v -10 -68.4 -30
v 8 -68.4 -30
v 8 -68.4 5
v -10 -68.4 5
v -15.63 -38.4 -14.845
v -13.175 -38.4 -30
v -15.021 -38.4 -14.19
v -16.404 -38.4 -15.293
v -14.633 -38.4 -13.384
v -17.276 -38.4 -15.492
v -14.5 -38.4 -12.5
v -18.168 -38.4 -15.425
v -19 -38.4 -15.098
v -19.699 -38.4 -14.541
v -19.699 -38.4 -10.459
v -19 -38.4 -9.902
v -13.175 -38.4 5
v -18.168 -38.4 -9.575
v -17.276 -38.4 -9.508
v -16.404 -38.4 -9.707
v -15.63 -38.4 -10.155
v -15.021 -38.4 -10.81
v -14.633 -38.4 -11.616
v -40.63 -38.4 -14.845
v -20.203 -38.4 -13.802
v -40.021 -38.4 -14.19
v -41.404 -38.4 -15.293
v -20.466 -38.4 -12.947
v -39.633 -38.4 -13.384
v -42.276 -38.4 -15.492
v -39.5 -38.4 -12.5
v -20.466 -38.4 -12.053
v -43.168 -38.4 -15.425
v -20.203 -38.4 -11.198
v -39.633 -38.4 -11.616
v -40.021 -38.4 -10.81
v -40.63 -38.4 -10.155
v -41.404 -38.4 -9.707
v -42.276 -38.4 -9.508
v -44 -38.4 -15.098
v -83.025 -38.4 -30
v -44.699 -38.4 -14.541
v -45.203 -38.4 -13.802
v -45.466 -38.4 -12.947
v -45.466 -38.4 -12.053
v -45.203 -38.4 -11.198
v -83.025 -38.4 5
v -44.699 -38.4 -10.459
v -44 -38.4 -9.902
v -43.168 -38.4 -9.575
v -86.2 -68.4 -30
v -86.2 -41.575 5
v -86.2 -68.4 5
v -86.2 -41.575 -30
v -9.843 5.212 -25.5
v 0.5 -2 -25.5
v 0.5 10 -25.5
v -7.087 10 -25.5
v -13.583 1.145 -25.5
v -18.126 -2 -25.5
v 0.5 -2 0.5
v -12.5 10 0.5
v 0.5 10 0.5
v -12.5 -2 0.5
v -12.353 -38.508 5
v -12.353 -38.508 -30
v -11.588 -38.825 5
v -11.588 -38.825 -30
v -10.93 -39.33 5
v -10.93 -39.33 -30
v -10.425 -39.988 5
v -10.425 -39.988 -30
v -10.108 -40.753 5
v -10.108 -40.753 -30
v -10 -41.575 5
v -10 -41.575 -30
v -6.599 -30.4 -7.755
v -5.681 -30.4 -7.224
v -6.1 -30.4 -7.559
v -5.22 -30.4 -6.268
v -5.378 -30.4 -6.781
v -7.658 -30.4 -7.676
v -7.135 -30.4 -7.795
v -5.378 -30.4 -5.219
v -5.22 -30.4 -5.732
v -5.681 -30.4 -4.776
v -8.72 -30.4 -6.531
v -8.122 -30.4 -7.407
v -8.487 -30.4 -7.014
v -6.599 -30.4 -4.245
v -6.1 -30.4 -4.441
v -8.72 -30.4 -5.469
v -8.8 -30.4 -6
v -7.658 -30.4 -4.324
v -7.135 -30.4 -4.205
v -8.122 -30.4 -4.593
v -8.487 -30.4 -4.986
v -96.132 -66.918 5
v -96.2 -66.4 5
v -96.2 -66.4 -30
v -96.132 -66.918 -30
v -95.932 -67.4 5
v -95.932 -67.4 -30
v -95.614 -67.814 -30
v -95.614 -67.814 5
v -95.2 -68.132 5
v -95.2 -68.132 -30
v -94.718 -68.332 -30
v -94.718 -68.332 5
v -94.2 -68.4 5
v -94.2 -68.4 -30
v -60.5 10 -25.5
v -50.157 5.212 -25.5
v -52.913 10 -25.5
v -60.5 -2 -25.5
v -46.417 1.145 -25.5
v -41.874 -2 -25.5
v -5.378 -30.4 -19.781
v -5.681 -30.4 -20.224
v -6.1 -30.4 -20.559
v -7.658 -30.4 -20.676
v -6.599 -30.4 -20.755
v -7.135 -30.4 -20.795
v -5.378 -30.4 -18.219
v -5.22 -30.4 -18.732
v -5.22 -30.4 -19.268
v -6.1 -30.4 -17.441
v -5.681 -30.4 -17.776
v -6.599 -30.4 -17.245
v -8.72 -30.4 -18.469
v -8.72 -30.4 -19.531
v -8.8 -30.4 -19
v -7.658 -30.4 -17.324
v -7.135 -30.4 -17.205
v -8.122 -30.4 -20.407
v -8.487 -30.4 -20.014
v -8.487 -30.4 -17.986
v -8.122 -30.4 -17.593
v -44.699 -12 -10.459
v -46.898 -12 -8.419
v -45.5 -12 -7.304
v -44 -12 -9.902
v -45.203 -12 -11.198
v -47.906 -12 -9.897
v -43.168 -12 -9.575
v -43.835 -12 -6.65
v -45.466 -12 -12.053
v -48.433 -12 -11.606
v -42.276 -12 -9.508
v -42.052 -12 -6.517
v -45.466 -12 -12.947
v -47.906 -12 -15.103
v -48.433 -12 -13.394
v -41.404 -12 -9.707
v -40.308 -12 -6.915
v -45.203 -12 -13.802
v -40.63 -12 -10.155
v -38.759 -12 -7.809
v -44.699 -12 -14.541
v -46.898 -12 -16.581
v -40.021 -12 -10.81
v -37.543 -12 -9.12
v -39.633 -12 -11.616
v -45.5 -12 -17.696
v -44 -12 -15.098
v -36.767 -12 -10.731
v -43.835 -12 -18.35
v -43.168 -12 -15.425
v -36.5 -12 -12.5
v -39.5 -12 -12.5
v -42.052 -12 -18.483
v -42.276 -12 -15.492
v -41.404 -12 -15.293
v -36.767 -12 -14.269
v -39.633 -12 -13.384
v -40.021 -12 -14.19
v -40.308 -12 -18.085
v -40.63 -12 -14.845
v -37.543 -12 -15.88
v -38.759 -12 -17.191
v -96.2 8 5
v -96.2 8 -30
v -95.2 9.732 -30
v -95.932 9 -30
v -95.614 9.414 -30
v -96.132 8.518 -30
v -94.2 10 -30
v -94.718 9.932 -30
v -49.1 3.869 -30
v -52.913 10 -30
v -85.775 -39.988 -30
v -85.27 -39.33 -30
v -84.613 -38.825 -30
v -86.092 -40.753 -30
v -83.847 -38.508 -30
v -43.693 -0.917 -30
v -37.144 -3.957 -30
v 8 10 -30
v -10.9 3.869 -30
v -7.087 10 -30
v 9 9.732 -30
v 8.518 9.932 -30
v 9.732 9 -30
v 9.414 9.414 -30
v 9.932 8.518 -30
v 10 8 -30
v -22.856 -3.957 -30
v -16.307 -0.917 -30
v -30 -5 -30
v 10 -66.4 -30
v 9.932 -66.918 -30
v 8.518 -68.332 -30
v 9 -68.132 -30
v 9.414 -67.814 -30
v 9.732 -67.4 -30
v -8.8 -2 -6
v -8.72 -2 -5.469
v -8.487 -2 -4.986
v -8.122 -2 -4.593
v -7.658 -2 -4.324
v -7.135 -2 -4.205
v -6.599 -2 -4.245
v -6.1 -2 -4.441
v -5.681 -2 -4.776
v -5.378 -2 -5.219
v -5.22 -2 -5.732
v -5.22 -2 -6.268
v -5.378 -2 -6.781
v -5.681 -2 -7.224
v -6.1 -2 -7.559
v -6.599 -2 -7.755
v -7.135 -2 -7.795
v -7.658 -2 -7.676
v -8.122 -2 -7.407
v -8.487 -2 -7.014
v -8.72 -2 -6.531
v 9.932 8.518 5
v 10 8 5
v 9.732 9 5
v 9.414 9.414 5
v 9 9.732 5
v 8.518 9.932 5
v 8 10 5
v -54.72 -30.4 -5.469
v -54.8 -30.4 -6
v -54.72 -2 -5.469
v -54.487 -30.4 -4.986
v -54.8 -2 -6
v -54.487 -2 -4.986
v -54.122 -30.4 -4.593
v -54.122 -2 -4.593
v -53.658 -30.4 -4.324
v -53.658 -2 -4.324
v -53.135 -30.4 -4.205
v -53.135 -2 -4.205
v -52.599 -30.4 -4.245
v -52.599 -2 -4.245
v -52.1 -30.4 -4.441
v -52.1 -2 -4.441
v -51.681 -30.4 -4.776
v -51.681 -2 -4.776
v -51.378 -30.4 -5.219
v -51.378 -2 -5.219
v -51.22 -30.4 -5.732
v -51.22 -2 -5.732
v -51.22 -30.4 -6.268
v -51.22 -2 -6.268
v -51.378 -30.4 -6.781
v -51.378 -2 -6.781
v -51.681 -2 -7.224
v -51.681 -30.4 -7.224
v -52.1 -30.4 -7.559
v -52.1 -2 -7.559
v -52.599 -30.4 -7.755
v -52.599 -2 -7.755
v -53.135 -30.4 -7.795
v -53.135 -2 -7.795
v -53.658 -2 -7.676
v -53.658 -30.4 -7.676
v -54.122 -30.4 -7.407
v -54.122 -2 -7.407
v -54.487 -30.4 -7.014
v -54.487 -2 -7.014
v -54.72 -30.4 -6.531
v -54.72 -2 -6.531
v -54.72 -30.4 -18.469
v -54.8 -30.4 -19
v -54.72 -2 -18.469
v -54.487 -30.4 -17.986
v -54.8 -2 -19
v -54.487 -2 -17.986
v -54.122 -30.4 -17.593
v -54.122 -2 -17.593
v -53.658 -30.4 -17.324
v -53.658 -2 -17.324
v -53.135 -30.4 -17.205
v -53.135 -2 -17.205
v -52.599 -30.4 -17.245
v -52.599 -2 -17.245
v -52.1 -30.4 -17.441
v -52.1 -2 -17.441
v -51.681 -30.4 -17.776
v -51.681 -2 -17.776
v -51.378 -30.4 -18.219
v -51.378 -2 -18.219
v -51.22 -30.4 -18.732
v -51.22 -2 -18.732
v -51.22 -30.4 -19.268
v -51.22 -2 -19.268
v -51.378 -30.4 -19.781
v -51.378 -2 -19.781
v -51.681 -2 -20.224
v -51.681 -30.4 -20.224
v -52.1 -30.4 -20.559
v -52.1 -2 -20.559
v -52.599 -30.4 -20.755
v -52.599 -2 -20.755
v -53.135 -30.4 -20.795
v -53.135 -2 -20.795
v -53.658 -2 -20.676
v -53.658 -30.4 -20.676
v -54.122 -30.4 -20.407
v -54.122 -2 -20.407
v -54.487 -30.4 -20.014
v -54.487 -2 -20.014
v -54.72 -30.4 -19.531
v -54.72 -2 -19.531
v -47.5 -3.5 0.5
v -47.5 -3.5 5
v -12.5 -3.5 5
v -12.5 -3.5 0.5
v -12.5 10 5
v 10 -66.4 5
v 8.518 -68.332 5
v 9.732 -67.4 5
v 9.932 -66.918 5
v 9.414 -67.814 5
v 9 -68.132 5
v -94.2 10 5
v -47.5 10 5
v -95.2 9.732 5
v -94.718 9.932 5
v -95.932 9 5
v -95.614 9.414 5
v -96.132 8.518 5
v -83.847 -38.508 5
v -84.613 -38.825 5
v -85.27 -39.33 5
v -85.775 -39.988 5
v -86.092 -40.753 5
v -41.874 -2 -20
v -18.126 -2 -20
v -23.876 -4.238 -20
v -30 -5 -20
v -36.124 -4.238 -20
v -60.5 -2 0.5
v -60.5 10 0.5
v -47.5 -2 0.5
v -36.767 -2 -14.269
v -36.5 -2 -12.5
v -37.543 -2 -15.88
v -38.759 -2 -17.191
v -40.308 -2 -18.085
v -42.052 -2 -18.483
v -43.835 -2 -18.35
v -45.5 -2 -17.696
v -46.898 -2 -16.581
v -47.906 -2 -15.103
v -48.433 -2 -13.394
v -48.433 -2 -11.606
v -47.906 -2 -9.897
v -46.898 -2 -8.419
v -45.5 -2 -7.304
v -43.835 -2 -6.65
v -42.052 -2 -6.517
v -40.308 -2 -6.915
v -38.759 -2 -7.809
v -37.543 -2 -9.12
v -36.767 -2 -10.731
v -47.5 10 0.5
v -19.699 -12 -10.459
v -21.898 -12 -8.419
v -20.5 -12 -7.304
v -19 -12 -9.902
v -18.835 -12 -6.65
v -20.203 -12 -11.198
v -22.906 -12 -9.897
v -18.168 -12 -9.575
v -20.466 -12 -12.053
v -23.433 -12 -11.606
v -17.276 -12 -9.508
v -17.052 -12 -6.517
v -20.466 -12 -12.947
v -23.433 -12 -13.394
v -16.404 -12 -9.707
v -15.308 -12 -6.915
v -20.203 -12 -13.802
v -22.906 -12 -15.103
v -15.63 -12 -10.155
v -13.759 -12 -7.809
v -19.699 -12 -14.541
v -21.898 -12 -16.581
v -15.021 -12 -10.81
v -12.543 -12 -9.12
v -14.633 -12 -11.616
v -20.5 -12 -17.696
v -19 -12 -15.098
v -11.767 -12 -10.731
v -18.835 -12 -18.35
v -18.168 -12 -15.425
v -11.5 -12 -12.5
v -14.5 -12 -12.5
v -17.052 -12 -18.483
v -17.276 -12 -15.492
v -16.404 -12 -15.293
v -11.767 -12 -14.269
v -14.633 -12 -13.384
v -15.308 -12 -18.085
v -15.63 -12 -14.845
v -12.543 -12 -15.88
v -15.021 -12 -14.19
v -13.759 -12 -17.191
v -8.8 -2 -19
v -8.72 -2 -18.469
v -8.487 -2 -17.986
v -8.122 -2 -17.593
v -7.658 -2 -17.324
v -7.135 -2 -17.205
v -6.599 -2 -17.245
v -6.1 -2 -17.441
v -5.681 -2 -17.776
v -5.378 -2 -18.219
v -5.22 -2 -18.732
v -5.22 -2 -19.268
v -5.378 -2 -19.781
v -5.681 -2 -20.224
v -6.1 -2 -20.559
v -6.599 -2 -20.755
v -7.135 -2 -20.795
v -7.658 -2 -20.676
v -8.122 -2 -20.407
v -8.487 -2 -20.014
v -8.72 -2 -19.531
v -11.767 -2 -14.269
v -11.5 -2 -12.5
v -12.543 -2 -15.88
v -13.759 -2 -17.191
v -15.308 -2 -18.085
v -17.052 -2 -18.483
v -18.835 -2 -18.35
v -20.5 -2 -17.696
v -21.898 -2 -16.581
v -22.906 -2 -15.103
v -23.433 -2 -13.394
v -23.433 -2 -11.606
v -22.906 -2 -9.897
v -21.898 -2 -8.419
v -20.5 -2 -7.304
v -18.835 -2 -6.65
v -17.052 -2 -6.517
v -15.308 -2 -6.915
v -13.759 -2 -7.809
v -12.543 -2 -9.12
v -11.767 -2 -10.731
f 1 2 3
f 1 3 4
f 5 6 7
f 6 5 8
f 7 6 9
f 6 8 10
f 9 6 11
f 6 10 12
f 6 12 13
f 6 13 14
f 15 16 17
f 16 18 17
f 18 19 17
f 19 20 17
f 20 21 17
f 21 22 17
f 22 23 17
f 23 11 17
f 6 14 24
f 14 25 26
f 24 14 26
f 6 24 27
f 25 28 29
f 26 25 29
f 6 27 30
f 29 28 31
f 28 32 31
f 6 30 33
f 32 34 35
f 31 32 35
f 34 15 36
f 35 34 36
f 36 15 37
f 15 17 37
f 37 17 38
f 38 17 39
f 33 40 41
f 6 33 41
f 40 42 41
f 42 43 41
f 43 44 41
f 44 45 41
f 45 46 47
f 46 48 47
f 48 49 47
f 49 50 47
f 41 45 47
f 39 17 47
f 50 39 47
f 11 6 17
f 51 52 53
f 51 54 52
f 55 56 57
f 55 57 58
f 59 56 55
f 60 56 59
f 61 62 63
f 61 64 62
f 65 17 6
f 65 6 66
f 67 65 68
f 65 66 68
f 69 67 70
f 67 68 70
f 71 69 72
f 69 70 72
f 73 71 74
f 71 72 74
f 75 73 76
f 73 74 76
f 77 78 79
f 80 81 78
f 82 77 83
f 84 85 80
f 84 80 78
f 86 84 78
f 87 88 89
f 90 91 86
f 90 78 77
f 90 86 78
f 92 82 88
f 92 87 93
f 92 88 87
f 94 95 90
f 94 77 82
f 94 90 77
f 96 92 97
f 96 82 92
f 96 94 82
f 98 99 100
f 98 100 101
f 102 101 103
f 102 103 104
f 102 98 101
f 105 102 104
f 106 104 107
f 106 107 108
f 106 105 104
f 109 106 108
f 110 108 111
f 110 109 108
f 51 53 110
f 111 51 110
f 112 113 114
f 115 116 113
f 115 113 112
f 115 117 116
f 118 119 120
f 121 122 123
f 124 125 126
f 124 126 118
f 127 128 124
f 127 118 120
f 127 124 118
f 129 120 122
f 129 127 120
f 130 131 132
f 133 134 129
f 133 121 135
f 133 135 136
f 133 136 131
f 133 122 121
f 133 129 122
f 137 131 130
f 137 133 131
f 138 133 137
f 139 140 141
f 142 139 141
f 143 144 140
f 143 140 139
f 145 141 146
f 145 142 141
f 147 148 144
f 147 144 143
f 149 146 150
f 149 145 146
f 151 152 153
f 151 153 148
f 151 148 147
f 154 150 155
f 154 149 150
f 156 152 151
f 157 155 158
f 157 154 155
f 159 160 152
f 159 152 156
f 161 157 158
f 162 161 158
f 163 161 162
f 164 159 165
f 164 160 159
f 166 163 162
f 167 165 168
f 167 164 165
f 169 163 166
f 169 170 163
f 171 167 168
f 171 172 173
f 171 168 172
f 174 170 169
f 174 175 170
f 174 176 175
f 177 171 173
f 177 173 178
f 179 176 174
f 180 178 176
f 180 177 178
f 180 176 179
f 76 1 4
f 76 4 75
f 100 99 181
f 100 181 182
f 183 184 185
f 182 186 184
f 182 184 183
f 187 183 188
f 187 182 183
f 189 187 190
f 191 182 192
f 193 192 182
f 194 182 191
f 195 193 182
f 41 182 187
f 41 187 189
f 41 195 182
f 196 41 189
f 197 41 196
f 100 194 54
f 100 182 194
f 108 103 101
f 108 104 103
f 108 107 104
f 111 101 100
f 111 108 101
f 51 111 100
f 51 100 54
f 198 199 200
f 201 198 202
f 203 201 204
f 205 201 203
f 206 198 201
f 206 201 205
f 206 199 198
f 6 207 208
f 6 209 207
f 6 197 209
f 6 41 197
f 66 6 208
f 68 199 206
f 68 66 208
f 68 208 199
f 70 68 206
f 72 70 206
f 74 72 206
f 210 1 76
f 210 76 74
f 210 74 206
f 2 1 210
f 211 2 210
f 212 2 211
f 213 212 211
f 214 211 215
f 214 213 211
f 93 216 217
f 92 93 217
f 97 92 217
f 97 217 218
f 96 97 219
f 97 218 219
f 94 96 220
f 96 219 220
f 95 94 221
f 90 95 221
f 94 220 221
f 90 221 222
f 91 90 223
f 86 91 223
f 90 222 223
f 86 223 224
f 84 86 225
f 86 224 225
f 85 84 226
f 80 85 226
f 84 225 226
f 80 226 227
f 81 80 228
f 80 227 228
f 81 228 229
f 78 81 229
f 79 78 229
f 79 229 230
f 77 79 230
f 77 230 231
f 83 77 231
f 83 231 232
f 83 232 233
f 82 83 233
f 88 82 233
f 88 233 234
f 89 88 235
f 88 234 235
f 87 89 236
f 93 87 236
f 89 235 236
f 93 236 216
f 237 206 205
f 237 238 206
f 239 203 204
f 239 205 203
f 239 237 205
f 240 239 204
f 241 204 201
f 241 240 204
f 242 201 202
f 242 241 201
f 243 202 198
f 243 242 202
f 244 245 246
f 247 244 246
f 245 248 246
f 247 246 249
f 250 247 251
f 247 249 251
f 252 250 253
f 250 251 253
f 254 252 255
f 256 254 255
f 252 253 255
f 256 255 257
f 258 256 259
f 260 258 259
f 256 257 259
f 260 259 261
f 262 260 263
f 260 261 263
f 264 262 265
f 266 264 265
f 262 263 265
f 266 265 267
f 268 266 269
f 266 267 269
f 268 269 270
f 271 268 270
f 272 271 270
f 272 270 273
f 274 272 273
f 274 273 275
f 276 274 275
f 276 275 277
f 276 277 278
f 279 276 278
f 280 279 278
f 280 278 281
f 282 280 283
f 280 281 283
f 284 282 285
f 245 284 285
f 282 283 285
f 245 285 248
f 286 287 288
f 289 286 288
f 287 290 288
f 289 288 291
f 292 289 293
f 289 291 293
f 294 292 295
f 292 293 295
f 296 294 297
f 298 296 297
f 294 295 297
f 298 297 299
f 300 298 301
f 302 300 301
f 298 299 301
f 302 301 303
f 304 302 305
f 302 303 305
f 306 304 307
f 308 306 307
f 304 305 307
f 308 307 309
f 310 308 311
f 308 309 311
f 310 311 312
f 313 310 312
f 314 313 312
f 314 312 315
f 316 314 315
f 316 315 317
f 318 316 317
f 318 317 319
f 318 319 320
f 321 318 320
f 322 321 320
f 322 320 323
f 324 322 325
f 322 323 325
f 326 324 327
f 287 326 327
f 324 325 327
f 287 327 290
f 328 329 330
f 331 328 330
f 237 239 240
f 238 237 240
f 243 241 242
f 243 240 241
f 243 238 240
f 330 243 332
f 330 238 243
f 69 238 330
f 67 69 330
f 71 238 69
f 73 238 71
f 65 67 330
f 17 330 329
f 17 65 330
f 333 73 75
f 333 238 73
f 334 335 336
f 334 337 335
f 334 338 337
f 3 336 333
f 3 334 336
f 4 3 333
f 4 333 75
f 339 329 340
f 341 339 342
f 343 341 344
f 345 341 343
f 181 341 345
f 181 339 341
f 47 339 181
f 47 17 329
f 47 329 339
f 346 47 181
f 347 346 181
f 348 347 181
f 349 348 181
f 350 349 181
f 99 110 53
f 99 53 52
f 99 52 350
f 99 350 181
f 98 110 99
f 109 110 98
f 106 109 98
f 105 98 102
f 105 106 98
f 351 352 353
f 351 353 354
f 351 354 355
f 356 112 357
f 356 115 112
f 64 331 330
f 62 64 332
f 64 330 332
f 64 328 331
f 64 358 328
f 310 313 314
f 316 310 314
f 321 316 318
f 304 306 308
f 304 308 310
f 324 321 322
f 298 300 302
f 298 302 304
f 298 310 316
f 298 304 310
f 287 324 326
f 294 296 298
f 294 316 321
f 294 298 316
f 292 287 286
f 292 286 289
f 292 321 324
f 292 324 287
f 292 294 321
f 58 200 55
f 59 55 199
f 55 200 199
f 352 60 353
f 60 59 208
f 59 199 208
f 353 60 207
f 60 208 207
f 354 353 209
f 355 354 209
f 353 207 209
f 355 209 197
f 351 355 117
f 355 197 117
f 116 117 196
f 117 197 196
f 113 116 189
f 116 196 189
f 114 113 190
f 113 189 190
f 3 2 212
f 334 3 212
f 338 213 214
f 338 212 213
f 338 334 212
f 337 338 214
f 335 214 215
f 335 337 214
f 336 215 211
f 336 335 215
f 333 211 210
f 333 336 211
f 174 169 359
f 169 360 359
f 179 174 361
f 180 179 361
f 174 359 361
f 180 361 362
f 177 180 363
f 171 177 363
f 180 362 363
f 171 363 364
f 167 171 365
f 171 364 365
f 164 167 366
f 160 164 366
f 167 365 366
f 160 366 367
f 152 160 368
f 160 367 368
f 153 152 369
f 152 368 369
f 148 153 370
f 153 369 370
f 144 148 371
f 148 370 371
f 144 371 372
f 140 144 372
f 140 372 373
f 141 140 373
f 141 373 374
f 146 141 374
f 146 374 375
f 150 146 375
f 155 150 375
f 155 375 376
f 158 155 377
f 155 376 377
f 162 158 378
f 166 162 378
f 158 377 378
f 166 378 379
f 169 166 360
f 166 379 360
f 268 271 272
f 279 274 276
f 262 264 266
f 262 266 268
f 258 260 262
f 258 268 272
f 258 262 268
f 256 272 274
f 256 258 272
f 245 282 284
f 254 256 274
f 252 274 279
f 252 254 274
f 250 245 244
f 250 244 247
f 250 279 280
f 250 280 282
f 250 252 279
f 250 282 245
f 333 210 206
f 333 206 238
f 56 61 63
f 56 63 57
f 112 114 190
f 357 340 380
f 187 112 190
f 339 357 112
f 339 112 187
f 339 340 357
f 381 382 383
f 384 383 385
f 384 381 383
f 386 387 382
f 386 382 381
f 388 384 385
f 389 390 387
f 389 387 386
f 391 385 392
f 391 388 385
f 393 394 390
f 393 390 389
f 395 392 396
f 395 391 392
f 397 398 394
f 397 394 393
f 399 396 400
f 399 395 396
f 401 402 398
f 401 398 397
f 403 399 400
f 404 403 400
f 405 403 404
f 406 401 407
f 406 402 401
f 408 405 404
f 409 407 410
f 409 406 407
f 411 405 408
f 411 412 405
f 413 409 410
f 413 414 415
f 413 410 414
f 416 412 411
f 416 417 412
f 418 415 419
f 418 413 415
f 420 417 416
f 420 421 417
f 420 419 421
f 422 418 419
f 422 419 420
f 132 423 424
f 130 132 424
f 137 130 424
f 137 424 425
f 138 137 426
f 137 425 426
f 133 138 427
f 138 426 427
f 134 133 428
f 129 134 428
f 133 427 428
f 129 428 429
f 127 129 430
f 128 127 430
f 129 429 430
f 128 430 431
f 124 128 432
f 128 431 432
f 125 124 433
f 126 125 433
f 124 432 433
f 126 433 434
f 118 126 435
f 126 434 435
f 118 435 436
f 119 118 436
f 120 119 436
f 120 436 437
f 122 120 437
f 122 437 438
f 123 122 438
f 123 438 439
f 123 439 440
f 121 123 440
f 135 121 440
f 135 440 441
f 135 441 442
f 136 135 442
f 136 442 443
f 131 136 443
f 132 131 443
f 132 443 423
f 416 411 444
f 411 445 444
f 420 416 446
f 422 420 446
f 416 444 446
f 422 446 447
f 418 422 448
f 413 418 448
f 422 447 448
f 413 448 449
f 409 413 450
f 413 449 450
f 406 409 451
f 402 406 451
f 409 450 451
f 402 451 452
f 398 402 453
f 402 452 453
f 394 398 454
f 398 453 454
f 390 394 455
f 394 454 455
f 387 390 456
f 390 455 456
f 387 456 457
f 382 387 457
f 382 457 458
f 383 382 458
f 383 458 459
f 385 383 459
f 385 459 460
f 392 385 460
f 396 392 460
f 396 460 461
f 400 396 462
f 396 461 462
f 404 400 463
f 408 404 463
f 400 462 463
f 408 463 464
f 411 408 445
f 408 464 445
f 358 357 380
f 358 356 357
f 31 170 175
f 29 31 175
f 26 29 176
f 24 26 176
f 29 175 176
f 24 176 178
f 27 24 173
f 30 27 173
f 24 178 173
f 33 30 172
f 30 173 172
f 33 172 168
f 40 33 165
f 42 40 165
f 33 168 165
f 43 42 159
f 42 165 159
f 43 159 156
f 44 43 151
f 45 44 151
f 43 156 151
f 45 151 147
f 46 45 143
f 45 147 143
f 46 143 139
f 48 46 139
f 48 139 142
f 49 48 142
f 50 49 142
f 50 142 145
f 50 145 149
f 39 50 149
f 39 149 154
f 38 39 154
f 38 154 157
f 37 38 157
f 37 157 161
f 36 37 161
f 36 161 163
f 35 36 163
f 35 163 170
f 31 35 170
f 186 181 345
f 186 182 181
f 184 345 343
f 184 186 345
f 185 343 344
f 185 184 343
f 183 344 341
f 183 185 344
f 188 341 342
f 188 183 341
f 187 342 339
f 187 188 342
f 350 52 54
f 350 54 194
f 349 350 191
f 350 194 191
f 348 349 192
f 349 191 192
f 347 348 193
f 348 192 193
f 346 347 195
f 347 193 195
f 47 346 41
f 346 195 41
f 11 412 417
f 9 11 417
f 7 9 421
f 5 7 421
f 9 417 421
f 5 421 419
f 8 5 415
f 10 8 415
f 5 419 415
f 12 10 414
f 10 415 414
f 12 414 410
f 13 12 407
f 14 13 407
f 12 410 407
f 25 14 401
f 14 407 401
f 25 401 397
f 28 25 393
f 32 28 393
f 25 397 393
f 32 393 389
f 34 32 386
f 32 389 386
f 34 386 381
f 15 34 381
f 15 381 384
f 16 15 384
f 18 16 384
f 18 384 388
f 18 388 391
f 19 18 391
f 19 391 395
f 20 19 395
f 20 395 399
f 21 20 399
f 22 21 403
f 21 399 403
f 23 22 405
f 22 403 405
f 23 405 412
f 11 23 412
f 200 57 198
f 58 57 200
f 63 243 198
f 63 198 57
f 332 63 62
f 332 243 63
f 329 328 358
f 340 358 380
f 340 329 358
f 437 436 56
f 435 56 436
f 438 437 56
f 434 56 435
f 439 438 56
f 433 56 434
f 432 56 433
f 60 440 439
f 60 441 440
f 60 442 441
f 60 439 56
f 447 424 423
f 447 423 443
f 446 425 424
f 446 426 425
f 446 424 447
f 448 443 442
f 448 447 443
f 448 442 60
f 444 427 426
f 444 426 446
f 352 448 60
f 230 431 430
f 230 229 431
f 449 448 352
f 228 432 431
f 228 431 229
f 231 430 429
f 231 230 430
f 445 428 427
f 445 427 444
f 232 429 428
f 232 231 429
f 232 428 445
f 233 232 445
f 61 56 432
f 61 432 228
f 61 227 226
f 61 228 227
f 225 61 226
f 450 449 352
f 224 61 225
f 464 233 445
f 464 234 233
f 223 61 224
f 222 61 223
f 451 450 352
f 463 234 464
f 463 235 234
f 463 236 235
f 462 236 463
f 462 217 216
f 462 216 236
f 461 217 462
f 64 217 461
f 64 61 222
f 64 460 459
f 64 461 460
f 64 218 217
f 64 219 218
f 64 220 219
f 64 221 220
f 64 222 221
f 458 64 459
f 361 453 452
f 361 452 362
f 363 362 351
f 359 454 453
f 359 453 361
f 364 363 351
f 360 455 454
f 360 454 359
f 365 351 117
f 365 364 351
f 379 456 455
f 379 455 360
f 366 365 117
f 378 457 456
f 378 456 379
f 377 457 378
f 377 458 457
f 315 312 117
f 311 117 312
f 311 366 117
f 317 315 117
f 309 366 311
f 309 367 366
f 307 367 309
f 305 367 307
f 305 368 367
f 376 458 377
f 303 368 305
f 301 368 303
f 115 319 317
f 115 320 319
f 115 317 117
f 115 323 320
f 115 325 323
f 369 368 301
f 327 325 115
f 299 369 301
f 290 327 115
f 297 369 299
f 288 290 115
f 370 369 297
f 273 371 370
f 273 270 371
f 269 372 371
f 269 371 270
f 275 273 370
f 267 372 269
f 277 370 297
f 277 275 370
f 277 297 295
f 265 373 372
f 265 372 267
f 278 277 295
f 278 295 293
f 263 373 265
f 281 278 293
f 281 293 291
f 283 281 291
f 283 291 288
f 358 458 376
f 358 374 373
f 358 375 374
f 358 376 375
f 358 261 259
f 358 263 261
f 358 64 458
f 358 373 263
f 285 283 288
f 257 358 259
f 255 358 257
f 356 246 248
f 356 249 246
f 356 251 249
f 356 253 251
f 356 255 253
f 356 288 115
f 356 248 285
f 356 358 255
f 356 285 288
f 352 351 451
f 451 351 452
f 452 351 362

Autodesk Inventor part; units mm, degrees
ref_plane "YZ Plane" through (0, 0, 0) normal (1, 0, 0) x (0, 1, 0)
ref_plane "XZ Plane" through (0, 0, 0) normal (0, 1, 0) x (-1, 0, 0)
ref_plane "XY Plane" through (0, 0, 0) normal (0, 0, 1) x (1, 0, 0)
sketch "Sketch1" plane through (0, 0, 0) normal (0, 1, 0) x (-1, 0, 0)
  line L0 (0, 0) -> (60, 0) construction
  line L1 (60, 0) -> (60, -25) construction
  line L2 (60, -25) -> (0, -25) construction
  line L3 (0, -25) -> (0, 0) construction
  line L4 (60.5, 0.5) -> (-0.5, 0.5)
  line L5 (-0.5, 0.5) -> (-0.5, -25.5)
  line L6 (-0.5, -25.5) -> (60.5, -25.5)
  line L7 (60.5, -25.5) -> (60.5, 0.5)
  circle A0 centre (53, -19) radius 1.8
  circle A1 centre (7, -19) radius 1.8
  circle A2 centre (7, -6) radius 1.8
  circle A3 centre (53, -6) radius 1.8
  line L8 (53, -19) -> (7, -19) construction
  line L9 (7, -19) -> (7, -6) construction
  point P0 (30, -19)
  point P1 (30, -25)
  point P2 (7, -12.5)
  point P3 (0, -12.5)
  dimension "d0" = 25
  dimension "d1" = 60
  dimension "d2" = 0.5
  dimension "d3" = 0.5
  dimension "d4" = 0.5
  dimension "d5" = 0.5
  dimension "d6" = 3.6
  dimension "d7" = 46
  dimension "d8" = 13
sketch "Sketch2" plane through (0, 0, 0) normal (0, 1, 0) x (-1, 0, 0)
  line L0 (-10, 5) -> (96.2, 5)
  line L1 (96.2, 5) -> (96.2, -30)
  line L2 (96.2, -30) -> (-10, -30)
  line L3 (-10, -30) -> (-10, 5)
  line L4 (60.5, -25.5) -> (60.5, 0.5) construction
  line L5 (-0.5, 0.5) -> (-0.5, -25.5) construction
  line L6 (-0.5, -25.5) -> (60.5, -25.5) construction
  point P0 (0, 0)
  point P1 (60.5, -12.5)
  point P2 (96.2, -12.5)
  point P3 (30, -25.5)
  point P4 (43.1, -30)
  point P5 (-10, -12.5)
  dimension "d9" = 106.2
  dimension "d10" = 35
  dimension "d51" = 10
extrude "Extrusion1" add sketch "Sketch2" along normal blind 10 and the other way blind 38.4
extrude "Extrusion2" cut sketch "Sketch1" along normal blind 10 and the other way blind 2
extrude "Extrusion3" cut sketch "Sketch1" along normal blind 10 and the other way blind 30.4 contours A0 | A1 | A2 | A3
sketch "Sketch3" plane through (10, 10, -30) normal (0, 0, -1) x (-1, 0, 0)
  line L0 (106.2, -48.4) -> (0, -48.4) projected
  line L1 (0, -48.4) -> (0, -78.4)
  line L2 (0, -78.4) -> (20, -78.4)
  line L3 (20, -78.4) -> (20, -51.575)
  line L4 (23.175, -48.4) -> (93.025, -48.4)
  line L5 (96.2, -51.575) -> (96.2, -78.4)
  line L6 (96.2, -78.4) -> (106.2, -78.4)
  line L7 (106.2, -78.4) -> (106.2, -48.4)
  arc A0 (23.175, -48.4) -> (20, -51.575) centre (23.175, -51.575) ccw
  arc A1 (96.2, -51.575) -> (93.025, -48.4) centre (93.025, -51.575) ccw
  point P0 (10, -10)
  point P1 (20, -48.4)
  point P2 (96.2, -48.4)
  point P3 (53.1, -48.4)
  point P4 (93.025, -48.4)
  dimension "d23" = 76.2
  dimension "d24" = 3.175
  dimension "d25" = 20
  dimension "d26" = 30
extrude "Extrusion4" add sketch "Sketch3" against normal up to surface (35 mm away)
sketch "Sketch4" plane through (0, -2, 0) normal (0, 1, 0) x (1, 0, 0)
  circle A0 centre (-42.5, 12.5) radius 3
  circle A1 centre (-17.5, 12.5) radius 3
  line L0 (-60.5, 25.5) -> (0.5, 25.5) construction
  line L1 (-60.5, -0.5) -> (-60.5, 25.5) construction
  line L2 (-42.5, 12.5) -> (-17.5, 12.5) construction
  point P0 (0, 0)
  point P1 (-30, 25.5)
  point P2 (-30, 12.5)
  point P3 (-60.5, 12.5)
  dimension "d29" = 6
  dimension "d30" = 25
extrude "Extrusion5" cut sketch "Sketch4" against normal up to surface (36.4 mm away)
sketch "Sketch5" plane through (0, -2, 0) normal (0, 1, 0) x (1, 0, 0)
  circle A0 centre (-42.5, 12.5) radius 3 construction
  circle A1 centre (-17.5, 12.5) radius 3 construction
  circle A2 centre (-17.5, 12.5) radius 6
  circle A3 centre (-42.5, 12.5) radius 6
  point P0 (0, 0)
  dimension "d34" = 12
extrude "Extrusion6" cut sketch "Sketch5" against normal blind 10
fillet "Fillet1" radius 2 2 edges at (-96.2, 10, -12.5) (10, 10, -12.5)
fillet "Fillet2" radius 2 2 edges at (-96.2, -68.4, -12.5) (10, -68.4, -12.5)
sketch "Sketch6" plane through (-83.025, -38.4, 5) normal (0, 0, 1) x (1, 0, 0)
  line L0 (69.85, 0) -> (0, 0) construction
  line L1 (35.525, 34.9) -> (70.525, 34.9)
  line L2 (69.85, 0) -> (0, 0) projected
  line L3 (-11.175, 48.4) -> (91.025, 48.4) projected
  line L4 (70.525, 34.9) -> (70.525, 48.4)
  line L5 (35.525, 34.9) -> (35.525, 48.4)
  line L6 (93.025, -28) -> (93.025, 46.4) projected
  point P0 (83.025, 38.4)
  point P1 (53.025, 34.9)
  point P2 (34.925, 0)
  point P3 (70.325, 0)
  point P4 (-0.475, 0)
  dimension "d39" = 34.9
  dimension "d40" = 35
  dimension "d50" = 40
extrude "Extrusion7" cut sketch "Sketch6" against normal up to surface (4.5 mm away)
sketch "Sketch7" plane through (-10, -68.4, -30) normal (0, 0, -1) x (-1, 0, 0)
  arc A0 (-2.9129, 78.4) -> (42.9129, 78.4) centre (20, 88.4) ccw
  line L0 (-18, 78.4) -> (84.2, 78.4) projected
  point P0 (-10, 68.4)
  point P1 (33.1, 78.4)
  point P2 (-20, 76.4)
  dimension "d44" = 25
  dimension "d45" = 10
  dimension "d49" = 40
extrude "Extrusion8" cut sketch "Sketch7" against normal blind 10
properties part number "BK12_Spacer"
